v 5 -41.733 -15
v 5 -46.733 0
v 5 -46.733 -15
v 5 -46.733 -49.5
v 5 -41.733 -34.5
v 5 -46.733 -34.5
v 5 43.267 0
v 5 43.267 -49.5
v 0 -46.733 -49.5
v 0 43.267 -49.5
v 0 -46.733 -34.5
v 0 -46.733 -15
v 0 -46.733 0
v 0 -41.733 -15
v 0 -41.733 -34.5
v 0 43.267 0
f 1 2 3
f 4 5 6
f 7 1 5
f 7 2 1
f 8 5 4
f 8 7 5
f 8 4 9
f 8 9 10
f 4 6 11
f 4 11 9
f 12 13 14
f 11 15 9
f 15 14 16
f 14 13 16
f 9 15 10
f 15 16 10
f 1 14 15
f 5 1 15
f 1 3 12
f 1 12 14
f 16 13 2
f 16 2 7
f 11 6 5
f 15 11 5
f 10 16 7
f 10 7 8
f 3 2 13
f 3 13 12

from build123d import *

# Parameters (mm, degrees)
SKETCH_1_W      = 49.5
SKETCH_1_H      = 85
EXTRUDE_1_DEPTH = 5
SKETCH_12_W     = 15
SKETCH_12_H     = 5
EXTRUDE_3_DEPTH = 5


with BuildPart() as part:
    # 스케치1 → 보스-돌출1 (new body)
    with BuildSketch(Plane(origin=(0, 0, 0), x_dir=(0, 0, -1), z_dir=(1, 0, 0))):
        with Locations((24.75, 0.767010447)):
            Rectangle(SKETCH_1_W, SKETCH_1_H)
    extrude(amount=EXTRUDE_1_DEPTH)

    # 스케치12 → 보스-돌출3 (add)
    with BuildSketch(Plane(origin=(5, 0, 0), x_dir=(0, 0, -1), z_dir=(1, 0, 0))):
        with Locations((42, -44.232989553)):
            Rectangle(SKETCH_12_W, SKETCH_12_H)
        with Locations((7.5, -44.232989553)):
            Rectangle(SKETCH_12_W, SKETCH_12_H)
    extrude(amount=-EXTRUDE_3_DEPTH)


solid = part.part
